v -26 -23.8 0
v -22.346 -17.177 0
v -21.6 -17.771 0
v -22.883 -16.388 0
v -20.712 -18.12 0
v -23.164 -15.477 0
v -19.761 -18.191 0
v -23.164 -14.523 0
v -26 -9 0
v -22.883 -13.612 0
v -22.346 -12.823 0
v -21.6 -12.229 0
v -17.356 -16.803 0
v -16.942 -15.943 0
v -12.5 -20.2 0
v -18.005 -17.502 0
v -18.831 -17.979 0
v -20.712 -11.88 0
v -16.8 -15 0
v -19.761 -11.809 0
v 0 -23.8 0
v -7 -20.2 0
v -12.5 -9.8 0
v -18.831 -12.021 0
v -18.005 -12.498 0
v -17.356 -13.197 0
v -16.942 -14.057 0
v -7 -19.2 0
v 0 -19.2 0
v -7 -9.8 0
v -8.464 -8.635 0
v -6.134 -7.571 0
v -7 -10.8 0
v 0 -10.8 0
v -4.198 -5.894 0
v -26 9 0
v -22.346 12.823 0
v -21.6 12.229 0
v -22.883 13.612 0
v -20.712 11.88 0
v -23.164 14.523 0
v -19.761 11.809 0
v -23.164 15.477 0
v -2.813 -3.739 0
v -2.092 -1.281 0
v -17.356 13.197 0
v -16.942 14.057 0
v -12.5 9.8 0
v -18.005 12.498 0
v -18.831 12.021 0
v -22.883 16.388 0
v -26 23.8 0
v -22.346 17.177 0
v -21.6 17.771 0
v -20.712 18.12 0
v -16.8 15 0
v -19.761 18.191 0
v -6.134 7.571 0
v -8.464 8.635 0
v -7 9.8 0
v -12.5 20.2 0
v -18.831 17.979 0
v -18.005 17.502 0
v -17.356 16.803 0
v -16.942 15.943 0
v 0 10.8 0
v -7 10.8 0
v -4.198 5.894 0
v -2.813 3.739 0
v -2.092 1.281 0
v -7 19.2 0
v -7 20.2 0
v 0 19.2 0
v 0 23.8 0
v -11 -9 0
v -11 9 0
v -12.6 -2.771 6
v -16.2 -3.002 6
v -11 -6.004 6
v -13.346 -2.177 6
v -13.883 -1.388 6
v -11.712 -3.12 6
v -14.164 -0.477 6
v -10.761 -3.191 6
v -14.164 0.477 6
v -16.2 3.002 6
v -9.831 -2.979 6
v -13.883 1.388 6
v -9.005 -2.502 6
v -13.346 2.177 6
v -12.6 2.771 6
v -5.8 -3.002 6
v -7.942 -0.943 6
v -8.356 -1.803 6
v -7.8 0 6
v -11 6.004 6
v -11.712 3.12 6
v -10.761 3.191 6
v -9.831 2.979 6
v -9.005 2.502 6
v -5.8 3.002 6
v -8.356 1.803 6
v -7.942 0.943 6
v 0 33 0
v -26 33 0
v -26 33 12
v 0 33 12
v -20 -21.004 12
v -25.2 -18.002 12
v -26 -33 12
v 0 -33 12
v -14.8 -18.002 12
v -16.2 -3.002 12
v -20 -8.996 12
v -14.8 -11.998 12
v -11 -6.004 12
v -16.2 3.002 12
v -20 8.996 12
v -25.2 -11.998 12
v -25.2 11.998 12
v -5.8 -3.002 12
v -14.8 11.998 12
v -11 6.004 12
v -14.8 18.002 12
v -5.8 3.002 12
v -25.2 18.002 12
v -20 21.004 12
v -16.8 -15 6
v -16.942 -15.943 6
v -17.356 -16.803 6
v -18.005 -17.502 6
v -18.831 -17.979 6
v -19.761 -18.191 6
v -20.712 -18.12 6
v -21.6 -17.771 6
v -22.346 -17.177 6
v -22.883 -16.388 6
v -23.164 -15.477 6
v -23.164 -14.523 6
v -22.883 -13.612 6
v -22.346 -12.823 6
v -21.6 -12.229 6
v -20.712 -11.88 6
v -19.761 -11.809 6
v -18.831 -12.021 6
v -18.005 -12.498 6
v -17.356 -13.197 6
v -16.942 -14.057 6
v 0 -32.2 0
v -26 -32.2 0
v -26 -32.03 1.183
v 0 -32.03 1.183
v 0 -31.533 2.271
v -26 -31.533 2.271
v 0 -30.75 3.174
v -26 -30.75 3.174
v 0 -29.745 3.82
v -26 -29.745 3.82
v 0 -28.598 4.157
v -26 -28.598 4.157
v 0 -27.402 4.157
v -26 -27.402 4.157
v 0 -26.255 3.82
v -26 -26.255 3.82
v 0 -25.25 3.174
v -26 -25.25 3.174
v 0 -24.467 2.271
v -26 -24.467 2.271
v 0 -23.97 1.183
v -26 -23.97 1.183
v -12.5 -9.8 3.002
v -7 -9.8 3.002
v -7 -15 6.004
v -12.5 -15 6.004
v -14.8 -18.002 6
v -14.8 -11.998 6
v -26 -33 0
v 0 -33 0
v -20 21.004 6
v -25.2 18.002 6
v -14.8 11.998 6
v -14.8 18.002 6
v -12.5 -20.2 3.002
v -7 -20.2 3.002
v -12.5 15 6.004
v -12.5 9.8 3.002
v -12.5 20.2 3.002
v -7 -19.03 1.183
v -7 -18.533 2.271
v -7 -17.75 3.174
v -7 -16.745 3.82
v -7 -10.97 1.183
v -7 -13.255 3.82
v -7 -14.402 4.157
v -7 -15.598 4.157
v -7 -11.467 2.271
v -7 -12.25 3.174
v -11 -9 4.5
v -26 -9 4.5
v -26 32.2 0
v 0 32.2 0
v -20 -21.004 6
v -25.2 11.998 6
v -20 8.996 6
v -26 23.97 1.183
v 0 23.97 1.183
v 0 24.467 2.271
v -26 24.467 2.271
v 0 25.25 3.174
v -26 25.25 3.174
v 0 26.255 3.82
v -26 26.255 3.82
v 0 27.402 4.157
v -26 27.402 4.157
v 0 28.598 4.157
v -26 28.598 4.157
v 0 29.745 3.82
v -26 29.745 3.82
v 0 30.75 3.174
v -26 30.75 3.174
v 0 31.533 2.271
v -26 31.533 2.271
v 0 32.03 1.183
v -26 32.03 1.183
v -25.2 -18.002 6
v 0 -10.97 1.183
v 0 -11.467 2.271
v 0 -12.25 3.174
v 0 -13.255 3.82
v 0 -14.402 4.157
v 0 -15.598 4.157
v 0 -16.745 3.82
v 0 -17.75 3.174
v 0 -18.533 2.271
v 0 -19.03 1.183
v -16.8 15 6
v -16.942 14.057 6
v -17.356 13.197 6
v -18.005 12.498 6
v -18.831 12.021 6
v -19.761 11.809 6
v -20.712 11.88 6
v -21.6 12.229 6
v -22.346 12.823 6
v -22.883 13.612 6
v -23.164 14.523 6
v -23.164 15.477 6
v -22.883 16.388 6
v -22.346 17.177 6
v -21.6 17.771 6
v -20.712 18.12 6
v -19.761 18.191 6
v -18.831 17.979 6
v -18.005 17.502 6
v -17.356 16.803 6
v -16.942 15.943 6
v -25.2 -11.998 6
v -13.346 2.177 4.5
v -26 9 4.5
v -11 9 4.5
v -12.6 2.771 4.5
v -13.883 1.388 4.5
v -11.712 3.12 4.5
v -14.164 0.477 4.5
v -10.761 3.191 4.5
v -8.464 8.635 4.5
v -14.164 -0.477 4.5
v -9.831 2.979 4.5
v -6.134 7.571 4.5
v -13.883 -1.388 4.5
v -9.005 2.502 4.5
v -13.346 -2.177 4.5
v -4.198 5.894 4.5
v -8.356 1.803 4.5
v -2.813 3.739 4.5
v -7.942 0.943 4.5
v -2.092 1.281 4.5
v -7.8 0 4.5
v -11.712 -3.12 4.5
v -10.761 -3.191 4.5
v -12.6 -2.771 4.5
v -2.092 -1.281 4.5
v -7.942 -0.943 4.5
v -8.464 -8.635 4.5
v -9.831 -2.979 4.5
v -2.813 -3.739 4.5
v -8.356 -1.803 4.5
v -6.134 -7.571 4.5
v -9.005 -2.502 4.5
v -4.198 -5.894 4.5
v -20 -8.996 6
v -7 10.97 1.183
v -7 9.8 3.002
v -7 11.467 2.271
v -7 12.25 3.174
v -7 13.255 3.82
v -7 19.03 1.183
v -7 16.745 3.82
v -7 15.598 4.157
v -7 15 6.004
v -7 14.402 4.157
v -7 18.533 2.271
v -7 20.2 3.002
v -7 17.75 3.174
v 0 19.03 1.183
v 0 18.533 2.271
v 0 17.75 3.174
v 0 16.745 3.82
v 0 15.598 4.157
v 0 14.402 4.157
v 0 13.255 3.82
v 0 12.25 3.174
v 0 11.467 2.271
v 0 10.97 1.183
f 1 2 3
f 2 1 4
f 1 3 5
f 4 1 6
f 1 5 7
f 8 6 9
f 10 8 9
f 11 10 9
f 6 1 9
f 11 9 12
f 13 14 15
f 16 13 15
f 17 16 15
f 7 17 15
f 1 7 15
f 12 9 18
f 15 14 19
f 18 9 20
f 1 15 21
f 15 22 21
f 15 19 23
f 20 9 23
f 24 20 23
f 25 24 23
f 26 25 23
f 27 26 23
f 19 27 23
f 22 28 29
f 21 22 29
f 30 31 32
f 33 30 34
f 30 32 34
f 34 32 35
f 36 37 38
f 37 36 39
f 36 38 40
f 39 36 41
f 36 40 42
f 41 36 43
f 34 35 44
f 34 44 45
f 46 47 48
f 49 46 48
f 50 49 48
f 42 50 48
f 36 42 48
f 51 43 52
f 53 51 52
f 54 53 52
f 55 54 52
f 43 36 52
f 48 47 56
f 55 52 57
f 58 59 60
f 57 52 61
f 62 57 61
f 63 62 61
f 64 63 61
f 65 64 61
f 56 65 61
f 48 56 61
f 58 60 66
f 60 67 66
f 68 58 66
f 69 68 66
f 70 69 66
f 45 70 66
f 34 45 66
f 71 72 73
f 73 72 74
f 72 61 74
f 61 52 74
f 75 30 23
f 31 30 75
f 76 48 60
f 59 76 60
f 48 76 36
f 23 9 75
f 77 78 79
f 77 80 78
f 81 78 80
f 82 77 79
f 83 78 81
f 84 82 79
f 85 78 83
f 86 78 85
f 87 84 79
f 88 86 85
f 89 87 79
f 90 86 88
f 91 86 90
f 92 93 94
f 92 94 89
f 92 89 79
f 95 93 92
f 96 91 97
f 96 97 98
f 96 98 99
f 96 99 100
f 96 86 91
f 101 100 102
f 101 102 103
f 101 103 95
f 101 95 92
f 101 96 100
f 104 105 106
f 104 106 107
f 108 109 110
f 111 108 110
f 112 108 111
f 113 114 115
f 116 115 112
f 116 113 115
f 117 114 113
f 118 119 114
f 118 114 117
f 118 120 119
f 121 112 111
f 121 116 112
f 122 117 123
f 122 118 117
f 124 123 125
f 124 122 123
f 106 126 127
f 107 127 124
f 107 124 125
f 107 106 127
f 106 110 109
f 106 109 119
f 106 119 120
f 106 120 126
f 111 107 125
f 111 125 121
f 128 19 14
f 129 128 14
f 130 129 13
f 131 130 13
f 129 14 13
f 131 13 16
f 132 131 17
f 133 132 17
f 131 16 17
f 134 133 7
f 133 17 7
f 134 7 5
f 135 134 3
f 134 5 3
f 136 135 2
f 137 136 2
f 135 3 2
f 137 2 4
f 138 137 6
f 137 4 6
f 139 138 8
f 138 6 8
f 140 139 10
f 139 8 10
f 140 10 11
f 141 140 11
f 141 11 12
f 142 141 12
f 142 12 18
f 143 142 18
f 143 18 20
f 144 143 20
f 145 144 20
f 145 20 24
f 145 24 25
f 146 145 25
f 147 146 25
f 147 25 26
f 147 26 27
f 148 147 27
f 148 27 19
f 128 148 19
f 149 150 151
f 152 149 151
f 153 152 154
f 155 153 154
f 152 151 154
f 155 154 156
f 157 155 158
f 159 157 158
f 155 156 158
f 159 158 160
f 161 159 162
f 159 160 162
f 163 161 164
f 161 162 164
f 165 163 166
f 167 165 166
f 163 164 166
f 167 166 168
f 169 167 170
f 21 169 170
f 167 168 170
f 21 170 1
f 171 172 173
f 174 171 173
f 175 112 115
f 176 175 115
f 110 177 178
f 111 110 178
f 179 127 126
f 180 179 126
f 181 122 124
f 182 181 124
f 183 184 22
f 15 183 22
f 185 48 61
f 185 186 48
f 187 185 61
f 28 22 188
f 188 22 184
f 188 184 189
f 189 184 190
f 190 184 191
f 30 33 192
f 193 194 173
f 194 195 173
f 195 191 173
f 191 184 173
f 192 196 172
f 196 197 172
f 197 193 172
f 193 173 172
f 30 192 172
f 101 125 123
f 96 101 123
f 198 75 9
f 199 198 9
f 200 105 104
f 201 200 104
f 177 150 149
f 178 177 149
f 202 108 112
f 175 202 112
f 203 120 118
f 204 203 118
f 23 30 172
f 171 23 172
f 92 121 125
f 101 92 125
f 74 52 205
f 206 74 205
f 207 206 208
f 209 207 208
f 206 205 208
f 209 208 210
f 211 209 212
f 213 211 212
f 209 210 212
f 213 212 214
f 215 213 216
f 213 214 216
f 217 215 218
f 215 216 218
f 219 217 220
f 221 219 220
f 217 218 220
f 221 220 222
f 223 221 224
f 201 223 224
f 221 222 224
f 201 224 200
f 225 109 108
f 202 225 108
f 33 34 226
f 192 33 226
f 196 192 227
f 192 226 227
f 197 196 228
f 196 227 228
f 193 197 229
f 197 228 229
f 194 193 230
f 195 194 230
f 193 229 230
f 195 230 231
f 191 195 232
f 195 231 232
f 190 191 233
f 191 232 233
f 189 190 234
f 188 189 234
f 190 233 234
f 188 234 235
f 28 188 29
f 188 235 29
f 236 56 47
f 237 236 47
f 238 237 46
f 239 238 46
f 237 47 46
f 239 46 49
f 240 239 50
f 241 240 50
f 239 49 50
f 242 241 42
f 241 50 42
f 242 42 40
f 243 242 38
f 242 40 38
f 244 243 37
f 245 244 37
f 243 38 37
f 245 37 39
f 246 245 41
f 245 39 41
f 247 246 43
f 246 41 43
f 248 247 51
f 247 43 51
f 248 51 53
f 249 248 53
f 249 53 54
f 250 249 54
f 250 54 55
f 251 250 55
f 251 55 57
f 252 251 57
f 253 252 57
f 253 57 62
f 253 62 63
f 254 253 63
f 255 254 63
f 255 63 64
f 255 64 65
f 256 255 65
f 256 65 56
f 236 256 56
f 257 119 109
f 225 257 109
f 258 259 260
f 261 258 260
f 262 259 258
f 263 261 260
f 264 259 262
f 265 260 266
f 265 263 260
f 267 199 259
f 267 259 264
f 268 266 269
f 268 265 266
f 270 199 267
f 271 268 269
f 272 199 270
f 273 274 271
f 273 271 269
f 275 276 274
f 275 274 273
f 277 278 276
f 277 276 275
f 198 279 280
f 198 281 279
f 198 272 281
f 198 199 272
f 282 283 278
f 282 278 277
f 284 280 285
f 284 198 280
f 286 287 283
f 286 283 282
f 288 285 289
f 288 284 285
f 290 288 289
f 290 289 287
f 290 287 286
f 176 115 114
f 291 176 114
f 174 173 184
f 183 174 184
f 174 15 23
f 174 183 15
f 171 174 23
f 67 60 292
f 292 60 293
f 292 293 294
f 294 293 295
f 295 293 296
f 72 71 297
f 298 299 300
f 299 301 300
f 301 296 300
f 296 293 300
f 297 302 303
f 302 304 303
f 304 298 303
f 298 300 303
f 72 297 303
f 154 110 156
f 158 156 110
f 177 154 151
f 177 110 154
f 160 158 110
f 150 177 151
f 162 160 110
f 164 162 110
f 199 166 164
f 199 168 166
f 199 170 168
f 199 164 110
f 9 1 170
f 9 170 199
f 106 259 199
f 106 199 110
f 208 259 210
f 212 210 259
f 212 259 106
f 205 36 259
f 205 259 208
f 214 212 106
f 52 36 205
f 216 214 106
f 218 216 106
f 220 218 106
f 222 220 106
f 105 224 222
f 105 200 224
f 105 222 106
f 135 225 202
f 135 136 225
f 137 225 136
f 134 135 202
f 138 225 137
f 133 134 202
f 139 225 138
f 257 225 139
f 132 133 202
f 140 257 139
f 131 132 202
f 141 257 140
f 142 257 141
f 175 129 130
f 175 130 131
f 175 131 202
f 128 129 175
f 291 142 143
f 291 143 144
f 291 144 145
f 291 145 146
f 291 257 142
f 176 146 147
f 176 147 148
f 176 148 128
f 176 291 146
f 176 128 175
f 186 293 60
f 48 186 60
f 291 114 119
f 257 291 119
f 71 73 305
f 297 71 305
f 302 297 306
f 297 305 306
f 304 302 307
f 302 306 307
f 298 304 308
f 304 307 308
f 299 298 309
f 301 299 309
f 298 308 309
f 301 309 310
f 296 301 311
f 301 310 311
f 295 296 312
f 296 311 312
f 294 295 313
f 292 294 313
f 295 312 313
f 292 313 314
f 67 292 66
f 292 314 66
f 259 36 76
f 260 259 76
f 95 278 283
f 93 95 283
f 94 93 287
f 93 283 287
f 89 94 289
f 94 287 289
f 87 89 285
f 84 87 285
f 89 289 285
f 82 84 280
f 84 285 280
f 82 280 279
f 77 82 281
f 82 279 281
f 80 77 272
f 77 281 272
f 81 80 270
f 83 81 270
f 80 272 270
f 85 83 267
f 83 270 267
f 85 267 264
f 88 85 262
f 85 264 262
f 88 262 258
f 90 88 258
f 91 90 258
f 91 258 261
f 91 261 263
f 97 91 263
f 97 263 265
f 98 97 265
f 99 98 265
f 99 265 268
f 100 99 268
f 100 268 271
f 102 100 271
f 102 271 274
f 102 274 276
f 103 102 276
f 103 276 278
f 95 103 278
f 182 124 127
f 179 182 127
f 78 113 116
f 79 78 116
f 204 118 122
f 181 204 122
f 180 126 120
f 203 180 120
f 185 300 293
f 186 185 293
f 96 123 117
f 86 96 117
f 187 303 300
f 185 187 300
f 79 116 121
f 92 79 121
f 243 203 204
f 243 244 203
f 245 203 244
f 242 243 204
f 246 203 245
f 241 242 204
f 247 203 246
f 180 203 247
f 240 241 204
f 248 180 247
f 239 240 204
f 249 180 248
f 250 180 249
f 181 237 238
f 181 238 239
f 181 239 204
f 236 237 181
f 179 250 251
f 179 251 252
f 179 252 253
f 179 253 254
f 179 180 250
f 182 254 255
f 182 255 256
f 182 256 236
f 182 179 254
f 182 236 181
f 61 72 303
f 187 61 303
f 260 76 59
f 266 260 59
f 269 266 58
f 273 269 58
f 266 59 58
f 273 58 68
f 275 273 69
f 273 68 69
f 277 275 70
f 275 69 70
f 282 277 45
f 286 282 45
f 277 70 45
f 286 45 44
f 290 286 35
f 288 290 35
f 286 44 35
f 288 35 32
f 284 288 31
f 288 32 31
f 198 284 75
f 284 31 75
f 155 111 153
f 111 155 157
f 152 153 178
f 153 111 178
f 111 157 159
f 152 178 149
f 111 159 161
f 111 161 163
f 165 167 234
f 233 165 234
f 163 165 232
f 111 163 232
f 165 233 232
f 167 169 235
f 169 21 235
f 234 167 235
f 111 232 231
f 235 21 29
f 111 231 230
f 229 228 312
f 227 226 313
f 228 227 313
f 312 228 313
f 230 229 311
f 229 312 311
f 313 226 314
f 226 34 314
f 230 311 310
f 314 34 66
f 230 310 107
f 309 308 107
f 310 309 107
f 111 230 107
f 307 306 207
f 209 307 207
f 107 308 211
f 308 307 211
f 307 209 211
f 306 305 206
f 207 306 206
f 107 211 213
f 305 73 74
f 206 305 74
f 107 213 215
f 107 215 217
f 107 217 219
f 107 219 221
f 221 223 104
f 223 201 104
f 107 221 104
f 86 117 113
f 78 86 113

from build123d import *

# Parameters (mm, degrees)
SKETCH_W        = 26
SKETCH_H        = 66
PAD_DEPTH       = 12
SKETCH001_R     = 4.2
POCKET_DEPTH    = 26.001
POCKET001_DEPTH = 4.5
SKETCH003_R     = 3.2
POCKET002_DEPTH = 12.001
SKETCH004_R     = 4.2
POCKET003_DEPTH = 7
POCKET004_DEPTH = 5.5
POCKET005_DEPTH = 6


with BuildPart() as part:
    # Sketch → Pad (new body)
    with BuildSketch(Plane.XY):
        with Locations((-13, 0)):
            Rectangle(SKETCH_W, SKETCH_H)
    extrude(amount=PAD_DEPTH)

    # Sketch001 (on Face4 of Pad) → Pocket (cut, through all)
    with BuildSketch(Plane(origin=(-26, 0, 0), x_dir=(0, -1, 0), z_dir=(-1, 0, 0))):
        with Locations((-28, 0)):
            Circle(SKETCH001_R)
        with Locations((28, 0)):
            Circle(SKETCH001_R)
    extrude(amount=-POCKET_DEPTH, mode=Mode.SUBTRACT)

    # Sketch002 (on Face8 of Pocket) → Pocket001 (cut)
    with BuildSketch(Plane(origin=(0, 0, 0), x_dir=(1, 0, 0), z_dir=(0, 0, -1))):
        with BuildLine():
            ThreePointArc((-11, -9), (-2, 0), (-11, 9))
            Line((-11, 9), (-26, 9))
            Line((-26, 9), (-26, -9))
            Line((-26, -9), (-11, -9))
        make_face()
    extrude(amount=-POCKET001_DEPTH, mode=Mode.SUBTRACT)

    # Sketch003 (on Face8 of Pocket001) → Pocket002 (cut, through all)
    with BuildSketch(Plane(origin=(0, 0, 0), x_dir=(1, 0, 0), z_dir=(0, 0, -1))):
        with Locations((-11, 0)):
            Circle(SKETCH003_R)
        with Locations((-20, 15)):
            Circle(SKETCH003_R)
        with Locations((-20, -15)):
            Circle(SKETCH003_R)
    extrude(amount=-POCKET002_DEPTH, mode=Mode.SUBTRACT)

    # Sketch004 (on Face3 of Pocket002) → Pocket003 (cut)
    with BuildSketch(Plane.YZ):
        with Locations((-15, 0)):
            Circle(SKETCH004_R)
        with Locations((15, 0)):
            Circle(SKETCH004_R)
    extrude(amount=-POCKET003_DEPTH, mode=Mode.SUBTRACT)

    # Sketch005 (on Face20 of Pocket003) → Pocket004 (cut)
    with BuildSketch(Plane.YZ.offset(-7)):
        Polygon((-9.8, -3.002221), (-9.8, 3.002221), (-15, 6.004443), (-20.2, 3.002221), (-20.2, -3.002221), (-15, -6.004443), align=None)
        Polygon((15, -6.004443), (20.2, -3.002221), (20.2, 3.002221), (15, 6.004443), (9.8, 3.002221), (9.8, -3.002221), align=None)
    extrude(amount=-POCKET004_DEPTH, mode=Mode.SUBTRACT)

    # Sketch006 (on Face5 of Pocket004) → Pocket005 (cut)
    with BuildSketch(Plane.XY.offset(12)):
        Polygon((-14.8, 11.997779), (-14.8, 18.002221), (-20, 21.004443), (-25.2, 18.002221), (-25.2, 11.997779), (-20, 8.995557), align=None)
        Polygon((-14.8, -18.002221), (-14.8, -11.997779), (-20, -8.995557), (-25.2, -11.997779), (-25.2, -18.002221), (-20, -21.004443), align=None)
        Polygon((-5.8, -3.002221), (-5.8, 3.002221), (-11, 6.004443), (-16.2, 3.002221), (-16.2, -3.002221), (-11, -6.004443), align=None)
    extrude(amount=-POCKET005_DEPTH, mode=Mode.SUBTRACT)


solid = part.part
